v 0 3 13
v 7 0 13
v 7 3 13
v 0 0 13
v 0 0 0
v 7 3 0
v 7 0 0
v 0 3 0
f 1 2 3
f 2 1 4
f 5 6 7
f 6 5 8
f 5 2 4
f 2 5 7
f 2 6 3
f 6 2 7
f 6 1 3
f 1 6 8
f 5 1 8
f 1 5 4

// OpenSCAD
// Generated by SolidPython 1.0.1 on 2020-07-29 00:46:54


cube(size = [7, 3, 13]);
/***********************************************
*********      SolidPython code:      **********
************************************************
 
# import packages: SolidPython
from solid import *
from solid.utils import *
from itertools import chain, combinations, permutations


class Resize:

    def __init__(self, scad_file):
        self.scad_file = scad_file
        #self.scad_file = import_scad(scad_file)
        # cone/cylinder param:
        self.r1 = 0
        self.r2 = 0
        self.h = 0
        # rectangular prism param:
        self.w = 0
        self.l = 0
        # ellipse param:
        self.r = 0

    # import OpenScad code (file name corresponds to shape)


    # classify shape + parameters
    def assign(self, param1, param2, param3):
        if self.scad_file == 'cone.scad':
            self.r1 = param1
            self.r2 = param2
            self.h = param3
        elif self.scad_file == 'cylinder.scad':
            self.r1 = param1
            self.r2 = param2
            self.h = param3
        elif self.scad_file == 'rectangularPrism.scad':
            self.h = param1
            self.l = param2
            self.w = param3
        else:
            self.r = param1
            self.h = param2

    # resize parameters
    def iterate(self):
        x = range(3, 20, 2)
        i = 1
        if self.scad_file == 'cone.scad':
            tempList = list(permutations(x, 2))
            for temp in tempList:
                param1 = temp[0]
                param2 = temp[1]
                filepath = 'produced_scad_files/' + 'cone' + str(param1) + '_' + str(param2) + '_' + '.scad'
                scad_render_to_file(cylinder(h=param1, r1=param2, r2=0), filepath)

        elif self.scad_file == 'cylinder.scad':
            tempList = list(permutations(x, 3))
            for temp in tempList:
                param1 = temp[0]
                param2 = temp[1]
                filepath = 'produced_scad_files/' + 'cylinder' + str(param1) + '_' + str(param2) + '_' + '.scad'
                scad_render_to_file(cylinder(h=param1, r1=param2, r2=param2), filepath)

        elif self.scad_file == 'rectangularPrism.scad':
            tempList = list(permutations(x, 3))
            for temp in tempList:
                param1 = temp[0]
                param2 = temp[1]
                param3 = temp[2]
                filepath = 'produced_scad_files/' + 'rectangularPrism' + str(param1) + '_' + str(param2) + '_' + str(
                    param3) + '.scad'
                scad_render_to_file(cube(size=(param1, param2, param3)), filepath)

        elif self.scad_file == 'ellipse.scad':
            tempList = list(permutations(x, 4))
            for temp in tempList:
                param1 = temp[0]
                param2 = temp[1]
                param3 = temp[2]
                param4 = temp[3]
                filepath = 'produced_scad_files/' + 'ellipse' + str(param1) + '_' + str(param2) + '_' + str(param3) + '_' + str(param4) + '.scad'
                scad_render_to_file(scale([param1, param2, param3])(sphere(r=param4)), filepath)

    def render_to_scadfile(self):
        scad_render_to_file(scad, 'example.scad') 
 
************************************************/
